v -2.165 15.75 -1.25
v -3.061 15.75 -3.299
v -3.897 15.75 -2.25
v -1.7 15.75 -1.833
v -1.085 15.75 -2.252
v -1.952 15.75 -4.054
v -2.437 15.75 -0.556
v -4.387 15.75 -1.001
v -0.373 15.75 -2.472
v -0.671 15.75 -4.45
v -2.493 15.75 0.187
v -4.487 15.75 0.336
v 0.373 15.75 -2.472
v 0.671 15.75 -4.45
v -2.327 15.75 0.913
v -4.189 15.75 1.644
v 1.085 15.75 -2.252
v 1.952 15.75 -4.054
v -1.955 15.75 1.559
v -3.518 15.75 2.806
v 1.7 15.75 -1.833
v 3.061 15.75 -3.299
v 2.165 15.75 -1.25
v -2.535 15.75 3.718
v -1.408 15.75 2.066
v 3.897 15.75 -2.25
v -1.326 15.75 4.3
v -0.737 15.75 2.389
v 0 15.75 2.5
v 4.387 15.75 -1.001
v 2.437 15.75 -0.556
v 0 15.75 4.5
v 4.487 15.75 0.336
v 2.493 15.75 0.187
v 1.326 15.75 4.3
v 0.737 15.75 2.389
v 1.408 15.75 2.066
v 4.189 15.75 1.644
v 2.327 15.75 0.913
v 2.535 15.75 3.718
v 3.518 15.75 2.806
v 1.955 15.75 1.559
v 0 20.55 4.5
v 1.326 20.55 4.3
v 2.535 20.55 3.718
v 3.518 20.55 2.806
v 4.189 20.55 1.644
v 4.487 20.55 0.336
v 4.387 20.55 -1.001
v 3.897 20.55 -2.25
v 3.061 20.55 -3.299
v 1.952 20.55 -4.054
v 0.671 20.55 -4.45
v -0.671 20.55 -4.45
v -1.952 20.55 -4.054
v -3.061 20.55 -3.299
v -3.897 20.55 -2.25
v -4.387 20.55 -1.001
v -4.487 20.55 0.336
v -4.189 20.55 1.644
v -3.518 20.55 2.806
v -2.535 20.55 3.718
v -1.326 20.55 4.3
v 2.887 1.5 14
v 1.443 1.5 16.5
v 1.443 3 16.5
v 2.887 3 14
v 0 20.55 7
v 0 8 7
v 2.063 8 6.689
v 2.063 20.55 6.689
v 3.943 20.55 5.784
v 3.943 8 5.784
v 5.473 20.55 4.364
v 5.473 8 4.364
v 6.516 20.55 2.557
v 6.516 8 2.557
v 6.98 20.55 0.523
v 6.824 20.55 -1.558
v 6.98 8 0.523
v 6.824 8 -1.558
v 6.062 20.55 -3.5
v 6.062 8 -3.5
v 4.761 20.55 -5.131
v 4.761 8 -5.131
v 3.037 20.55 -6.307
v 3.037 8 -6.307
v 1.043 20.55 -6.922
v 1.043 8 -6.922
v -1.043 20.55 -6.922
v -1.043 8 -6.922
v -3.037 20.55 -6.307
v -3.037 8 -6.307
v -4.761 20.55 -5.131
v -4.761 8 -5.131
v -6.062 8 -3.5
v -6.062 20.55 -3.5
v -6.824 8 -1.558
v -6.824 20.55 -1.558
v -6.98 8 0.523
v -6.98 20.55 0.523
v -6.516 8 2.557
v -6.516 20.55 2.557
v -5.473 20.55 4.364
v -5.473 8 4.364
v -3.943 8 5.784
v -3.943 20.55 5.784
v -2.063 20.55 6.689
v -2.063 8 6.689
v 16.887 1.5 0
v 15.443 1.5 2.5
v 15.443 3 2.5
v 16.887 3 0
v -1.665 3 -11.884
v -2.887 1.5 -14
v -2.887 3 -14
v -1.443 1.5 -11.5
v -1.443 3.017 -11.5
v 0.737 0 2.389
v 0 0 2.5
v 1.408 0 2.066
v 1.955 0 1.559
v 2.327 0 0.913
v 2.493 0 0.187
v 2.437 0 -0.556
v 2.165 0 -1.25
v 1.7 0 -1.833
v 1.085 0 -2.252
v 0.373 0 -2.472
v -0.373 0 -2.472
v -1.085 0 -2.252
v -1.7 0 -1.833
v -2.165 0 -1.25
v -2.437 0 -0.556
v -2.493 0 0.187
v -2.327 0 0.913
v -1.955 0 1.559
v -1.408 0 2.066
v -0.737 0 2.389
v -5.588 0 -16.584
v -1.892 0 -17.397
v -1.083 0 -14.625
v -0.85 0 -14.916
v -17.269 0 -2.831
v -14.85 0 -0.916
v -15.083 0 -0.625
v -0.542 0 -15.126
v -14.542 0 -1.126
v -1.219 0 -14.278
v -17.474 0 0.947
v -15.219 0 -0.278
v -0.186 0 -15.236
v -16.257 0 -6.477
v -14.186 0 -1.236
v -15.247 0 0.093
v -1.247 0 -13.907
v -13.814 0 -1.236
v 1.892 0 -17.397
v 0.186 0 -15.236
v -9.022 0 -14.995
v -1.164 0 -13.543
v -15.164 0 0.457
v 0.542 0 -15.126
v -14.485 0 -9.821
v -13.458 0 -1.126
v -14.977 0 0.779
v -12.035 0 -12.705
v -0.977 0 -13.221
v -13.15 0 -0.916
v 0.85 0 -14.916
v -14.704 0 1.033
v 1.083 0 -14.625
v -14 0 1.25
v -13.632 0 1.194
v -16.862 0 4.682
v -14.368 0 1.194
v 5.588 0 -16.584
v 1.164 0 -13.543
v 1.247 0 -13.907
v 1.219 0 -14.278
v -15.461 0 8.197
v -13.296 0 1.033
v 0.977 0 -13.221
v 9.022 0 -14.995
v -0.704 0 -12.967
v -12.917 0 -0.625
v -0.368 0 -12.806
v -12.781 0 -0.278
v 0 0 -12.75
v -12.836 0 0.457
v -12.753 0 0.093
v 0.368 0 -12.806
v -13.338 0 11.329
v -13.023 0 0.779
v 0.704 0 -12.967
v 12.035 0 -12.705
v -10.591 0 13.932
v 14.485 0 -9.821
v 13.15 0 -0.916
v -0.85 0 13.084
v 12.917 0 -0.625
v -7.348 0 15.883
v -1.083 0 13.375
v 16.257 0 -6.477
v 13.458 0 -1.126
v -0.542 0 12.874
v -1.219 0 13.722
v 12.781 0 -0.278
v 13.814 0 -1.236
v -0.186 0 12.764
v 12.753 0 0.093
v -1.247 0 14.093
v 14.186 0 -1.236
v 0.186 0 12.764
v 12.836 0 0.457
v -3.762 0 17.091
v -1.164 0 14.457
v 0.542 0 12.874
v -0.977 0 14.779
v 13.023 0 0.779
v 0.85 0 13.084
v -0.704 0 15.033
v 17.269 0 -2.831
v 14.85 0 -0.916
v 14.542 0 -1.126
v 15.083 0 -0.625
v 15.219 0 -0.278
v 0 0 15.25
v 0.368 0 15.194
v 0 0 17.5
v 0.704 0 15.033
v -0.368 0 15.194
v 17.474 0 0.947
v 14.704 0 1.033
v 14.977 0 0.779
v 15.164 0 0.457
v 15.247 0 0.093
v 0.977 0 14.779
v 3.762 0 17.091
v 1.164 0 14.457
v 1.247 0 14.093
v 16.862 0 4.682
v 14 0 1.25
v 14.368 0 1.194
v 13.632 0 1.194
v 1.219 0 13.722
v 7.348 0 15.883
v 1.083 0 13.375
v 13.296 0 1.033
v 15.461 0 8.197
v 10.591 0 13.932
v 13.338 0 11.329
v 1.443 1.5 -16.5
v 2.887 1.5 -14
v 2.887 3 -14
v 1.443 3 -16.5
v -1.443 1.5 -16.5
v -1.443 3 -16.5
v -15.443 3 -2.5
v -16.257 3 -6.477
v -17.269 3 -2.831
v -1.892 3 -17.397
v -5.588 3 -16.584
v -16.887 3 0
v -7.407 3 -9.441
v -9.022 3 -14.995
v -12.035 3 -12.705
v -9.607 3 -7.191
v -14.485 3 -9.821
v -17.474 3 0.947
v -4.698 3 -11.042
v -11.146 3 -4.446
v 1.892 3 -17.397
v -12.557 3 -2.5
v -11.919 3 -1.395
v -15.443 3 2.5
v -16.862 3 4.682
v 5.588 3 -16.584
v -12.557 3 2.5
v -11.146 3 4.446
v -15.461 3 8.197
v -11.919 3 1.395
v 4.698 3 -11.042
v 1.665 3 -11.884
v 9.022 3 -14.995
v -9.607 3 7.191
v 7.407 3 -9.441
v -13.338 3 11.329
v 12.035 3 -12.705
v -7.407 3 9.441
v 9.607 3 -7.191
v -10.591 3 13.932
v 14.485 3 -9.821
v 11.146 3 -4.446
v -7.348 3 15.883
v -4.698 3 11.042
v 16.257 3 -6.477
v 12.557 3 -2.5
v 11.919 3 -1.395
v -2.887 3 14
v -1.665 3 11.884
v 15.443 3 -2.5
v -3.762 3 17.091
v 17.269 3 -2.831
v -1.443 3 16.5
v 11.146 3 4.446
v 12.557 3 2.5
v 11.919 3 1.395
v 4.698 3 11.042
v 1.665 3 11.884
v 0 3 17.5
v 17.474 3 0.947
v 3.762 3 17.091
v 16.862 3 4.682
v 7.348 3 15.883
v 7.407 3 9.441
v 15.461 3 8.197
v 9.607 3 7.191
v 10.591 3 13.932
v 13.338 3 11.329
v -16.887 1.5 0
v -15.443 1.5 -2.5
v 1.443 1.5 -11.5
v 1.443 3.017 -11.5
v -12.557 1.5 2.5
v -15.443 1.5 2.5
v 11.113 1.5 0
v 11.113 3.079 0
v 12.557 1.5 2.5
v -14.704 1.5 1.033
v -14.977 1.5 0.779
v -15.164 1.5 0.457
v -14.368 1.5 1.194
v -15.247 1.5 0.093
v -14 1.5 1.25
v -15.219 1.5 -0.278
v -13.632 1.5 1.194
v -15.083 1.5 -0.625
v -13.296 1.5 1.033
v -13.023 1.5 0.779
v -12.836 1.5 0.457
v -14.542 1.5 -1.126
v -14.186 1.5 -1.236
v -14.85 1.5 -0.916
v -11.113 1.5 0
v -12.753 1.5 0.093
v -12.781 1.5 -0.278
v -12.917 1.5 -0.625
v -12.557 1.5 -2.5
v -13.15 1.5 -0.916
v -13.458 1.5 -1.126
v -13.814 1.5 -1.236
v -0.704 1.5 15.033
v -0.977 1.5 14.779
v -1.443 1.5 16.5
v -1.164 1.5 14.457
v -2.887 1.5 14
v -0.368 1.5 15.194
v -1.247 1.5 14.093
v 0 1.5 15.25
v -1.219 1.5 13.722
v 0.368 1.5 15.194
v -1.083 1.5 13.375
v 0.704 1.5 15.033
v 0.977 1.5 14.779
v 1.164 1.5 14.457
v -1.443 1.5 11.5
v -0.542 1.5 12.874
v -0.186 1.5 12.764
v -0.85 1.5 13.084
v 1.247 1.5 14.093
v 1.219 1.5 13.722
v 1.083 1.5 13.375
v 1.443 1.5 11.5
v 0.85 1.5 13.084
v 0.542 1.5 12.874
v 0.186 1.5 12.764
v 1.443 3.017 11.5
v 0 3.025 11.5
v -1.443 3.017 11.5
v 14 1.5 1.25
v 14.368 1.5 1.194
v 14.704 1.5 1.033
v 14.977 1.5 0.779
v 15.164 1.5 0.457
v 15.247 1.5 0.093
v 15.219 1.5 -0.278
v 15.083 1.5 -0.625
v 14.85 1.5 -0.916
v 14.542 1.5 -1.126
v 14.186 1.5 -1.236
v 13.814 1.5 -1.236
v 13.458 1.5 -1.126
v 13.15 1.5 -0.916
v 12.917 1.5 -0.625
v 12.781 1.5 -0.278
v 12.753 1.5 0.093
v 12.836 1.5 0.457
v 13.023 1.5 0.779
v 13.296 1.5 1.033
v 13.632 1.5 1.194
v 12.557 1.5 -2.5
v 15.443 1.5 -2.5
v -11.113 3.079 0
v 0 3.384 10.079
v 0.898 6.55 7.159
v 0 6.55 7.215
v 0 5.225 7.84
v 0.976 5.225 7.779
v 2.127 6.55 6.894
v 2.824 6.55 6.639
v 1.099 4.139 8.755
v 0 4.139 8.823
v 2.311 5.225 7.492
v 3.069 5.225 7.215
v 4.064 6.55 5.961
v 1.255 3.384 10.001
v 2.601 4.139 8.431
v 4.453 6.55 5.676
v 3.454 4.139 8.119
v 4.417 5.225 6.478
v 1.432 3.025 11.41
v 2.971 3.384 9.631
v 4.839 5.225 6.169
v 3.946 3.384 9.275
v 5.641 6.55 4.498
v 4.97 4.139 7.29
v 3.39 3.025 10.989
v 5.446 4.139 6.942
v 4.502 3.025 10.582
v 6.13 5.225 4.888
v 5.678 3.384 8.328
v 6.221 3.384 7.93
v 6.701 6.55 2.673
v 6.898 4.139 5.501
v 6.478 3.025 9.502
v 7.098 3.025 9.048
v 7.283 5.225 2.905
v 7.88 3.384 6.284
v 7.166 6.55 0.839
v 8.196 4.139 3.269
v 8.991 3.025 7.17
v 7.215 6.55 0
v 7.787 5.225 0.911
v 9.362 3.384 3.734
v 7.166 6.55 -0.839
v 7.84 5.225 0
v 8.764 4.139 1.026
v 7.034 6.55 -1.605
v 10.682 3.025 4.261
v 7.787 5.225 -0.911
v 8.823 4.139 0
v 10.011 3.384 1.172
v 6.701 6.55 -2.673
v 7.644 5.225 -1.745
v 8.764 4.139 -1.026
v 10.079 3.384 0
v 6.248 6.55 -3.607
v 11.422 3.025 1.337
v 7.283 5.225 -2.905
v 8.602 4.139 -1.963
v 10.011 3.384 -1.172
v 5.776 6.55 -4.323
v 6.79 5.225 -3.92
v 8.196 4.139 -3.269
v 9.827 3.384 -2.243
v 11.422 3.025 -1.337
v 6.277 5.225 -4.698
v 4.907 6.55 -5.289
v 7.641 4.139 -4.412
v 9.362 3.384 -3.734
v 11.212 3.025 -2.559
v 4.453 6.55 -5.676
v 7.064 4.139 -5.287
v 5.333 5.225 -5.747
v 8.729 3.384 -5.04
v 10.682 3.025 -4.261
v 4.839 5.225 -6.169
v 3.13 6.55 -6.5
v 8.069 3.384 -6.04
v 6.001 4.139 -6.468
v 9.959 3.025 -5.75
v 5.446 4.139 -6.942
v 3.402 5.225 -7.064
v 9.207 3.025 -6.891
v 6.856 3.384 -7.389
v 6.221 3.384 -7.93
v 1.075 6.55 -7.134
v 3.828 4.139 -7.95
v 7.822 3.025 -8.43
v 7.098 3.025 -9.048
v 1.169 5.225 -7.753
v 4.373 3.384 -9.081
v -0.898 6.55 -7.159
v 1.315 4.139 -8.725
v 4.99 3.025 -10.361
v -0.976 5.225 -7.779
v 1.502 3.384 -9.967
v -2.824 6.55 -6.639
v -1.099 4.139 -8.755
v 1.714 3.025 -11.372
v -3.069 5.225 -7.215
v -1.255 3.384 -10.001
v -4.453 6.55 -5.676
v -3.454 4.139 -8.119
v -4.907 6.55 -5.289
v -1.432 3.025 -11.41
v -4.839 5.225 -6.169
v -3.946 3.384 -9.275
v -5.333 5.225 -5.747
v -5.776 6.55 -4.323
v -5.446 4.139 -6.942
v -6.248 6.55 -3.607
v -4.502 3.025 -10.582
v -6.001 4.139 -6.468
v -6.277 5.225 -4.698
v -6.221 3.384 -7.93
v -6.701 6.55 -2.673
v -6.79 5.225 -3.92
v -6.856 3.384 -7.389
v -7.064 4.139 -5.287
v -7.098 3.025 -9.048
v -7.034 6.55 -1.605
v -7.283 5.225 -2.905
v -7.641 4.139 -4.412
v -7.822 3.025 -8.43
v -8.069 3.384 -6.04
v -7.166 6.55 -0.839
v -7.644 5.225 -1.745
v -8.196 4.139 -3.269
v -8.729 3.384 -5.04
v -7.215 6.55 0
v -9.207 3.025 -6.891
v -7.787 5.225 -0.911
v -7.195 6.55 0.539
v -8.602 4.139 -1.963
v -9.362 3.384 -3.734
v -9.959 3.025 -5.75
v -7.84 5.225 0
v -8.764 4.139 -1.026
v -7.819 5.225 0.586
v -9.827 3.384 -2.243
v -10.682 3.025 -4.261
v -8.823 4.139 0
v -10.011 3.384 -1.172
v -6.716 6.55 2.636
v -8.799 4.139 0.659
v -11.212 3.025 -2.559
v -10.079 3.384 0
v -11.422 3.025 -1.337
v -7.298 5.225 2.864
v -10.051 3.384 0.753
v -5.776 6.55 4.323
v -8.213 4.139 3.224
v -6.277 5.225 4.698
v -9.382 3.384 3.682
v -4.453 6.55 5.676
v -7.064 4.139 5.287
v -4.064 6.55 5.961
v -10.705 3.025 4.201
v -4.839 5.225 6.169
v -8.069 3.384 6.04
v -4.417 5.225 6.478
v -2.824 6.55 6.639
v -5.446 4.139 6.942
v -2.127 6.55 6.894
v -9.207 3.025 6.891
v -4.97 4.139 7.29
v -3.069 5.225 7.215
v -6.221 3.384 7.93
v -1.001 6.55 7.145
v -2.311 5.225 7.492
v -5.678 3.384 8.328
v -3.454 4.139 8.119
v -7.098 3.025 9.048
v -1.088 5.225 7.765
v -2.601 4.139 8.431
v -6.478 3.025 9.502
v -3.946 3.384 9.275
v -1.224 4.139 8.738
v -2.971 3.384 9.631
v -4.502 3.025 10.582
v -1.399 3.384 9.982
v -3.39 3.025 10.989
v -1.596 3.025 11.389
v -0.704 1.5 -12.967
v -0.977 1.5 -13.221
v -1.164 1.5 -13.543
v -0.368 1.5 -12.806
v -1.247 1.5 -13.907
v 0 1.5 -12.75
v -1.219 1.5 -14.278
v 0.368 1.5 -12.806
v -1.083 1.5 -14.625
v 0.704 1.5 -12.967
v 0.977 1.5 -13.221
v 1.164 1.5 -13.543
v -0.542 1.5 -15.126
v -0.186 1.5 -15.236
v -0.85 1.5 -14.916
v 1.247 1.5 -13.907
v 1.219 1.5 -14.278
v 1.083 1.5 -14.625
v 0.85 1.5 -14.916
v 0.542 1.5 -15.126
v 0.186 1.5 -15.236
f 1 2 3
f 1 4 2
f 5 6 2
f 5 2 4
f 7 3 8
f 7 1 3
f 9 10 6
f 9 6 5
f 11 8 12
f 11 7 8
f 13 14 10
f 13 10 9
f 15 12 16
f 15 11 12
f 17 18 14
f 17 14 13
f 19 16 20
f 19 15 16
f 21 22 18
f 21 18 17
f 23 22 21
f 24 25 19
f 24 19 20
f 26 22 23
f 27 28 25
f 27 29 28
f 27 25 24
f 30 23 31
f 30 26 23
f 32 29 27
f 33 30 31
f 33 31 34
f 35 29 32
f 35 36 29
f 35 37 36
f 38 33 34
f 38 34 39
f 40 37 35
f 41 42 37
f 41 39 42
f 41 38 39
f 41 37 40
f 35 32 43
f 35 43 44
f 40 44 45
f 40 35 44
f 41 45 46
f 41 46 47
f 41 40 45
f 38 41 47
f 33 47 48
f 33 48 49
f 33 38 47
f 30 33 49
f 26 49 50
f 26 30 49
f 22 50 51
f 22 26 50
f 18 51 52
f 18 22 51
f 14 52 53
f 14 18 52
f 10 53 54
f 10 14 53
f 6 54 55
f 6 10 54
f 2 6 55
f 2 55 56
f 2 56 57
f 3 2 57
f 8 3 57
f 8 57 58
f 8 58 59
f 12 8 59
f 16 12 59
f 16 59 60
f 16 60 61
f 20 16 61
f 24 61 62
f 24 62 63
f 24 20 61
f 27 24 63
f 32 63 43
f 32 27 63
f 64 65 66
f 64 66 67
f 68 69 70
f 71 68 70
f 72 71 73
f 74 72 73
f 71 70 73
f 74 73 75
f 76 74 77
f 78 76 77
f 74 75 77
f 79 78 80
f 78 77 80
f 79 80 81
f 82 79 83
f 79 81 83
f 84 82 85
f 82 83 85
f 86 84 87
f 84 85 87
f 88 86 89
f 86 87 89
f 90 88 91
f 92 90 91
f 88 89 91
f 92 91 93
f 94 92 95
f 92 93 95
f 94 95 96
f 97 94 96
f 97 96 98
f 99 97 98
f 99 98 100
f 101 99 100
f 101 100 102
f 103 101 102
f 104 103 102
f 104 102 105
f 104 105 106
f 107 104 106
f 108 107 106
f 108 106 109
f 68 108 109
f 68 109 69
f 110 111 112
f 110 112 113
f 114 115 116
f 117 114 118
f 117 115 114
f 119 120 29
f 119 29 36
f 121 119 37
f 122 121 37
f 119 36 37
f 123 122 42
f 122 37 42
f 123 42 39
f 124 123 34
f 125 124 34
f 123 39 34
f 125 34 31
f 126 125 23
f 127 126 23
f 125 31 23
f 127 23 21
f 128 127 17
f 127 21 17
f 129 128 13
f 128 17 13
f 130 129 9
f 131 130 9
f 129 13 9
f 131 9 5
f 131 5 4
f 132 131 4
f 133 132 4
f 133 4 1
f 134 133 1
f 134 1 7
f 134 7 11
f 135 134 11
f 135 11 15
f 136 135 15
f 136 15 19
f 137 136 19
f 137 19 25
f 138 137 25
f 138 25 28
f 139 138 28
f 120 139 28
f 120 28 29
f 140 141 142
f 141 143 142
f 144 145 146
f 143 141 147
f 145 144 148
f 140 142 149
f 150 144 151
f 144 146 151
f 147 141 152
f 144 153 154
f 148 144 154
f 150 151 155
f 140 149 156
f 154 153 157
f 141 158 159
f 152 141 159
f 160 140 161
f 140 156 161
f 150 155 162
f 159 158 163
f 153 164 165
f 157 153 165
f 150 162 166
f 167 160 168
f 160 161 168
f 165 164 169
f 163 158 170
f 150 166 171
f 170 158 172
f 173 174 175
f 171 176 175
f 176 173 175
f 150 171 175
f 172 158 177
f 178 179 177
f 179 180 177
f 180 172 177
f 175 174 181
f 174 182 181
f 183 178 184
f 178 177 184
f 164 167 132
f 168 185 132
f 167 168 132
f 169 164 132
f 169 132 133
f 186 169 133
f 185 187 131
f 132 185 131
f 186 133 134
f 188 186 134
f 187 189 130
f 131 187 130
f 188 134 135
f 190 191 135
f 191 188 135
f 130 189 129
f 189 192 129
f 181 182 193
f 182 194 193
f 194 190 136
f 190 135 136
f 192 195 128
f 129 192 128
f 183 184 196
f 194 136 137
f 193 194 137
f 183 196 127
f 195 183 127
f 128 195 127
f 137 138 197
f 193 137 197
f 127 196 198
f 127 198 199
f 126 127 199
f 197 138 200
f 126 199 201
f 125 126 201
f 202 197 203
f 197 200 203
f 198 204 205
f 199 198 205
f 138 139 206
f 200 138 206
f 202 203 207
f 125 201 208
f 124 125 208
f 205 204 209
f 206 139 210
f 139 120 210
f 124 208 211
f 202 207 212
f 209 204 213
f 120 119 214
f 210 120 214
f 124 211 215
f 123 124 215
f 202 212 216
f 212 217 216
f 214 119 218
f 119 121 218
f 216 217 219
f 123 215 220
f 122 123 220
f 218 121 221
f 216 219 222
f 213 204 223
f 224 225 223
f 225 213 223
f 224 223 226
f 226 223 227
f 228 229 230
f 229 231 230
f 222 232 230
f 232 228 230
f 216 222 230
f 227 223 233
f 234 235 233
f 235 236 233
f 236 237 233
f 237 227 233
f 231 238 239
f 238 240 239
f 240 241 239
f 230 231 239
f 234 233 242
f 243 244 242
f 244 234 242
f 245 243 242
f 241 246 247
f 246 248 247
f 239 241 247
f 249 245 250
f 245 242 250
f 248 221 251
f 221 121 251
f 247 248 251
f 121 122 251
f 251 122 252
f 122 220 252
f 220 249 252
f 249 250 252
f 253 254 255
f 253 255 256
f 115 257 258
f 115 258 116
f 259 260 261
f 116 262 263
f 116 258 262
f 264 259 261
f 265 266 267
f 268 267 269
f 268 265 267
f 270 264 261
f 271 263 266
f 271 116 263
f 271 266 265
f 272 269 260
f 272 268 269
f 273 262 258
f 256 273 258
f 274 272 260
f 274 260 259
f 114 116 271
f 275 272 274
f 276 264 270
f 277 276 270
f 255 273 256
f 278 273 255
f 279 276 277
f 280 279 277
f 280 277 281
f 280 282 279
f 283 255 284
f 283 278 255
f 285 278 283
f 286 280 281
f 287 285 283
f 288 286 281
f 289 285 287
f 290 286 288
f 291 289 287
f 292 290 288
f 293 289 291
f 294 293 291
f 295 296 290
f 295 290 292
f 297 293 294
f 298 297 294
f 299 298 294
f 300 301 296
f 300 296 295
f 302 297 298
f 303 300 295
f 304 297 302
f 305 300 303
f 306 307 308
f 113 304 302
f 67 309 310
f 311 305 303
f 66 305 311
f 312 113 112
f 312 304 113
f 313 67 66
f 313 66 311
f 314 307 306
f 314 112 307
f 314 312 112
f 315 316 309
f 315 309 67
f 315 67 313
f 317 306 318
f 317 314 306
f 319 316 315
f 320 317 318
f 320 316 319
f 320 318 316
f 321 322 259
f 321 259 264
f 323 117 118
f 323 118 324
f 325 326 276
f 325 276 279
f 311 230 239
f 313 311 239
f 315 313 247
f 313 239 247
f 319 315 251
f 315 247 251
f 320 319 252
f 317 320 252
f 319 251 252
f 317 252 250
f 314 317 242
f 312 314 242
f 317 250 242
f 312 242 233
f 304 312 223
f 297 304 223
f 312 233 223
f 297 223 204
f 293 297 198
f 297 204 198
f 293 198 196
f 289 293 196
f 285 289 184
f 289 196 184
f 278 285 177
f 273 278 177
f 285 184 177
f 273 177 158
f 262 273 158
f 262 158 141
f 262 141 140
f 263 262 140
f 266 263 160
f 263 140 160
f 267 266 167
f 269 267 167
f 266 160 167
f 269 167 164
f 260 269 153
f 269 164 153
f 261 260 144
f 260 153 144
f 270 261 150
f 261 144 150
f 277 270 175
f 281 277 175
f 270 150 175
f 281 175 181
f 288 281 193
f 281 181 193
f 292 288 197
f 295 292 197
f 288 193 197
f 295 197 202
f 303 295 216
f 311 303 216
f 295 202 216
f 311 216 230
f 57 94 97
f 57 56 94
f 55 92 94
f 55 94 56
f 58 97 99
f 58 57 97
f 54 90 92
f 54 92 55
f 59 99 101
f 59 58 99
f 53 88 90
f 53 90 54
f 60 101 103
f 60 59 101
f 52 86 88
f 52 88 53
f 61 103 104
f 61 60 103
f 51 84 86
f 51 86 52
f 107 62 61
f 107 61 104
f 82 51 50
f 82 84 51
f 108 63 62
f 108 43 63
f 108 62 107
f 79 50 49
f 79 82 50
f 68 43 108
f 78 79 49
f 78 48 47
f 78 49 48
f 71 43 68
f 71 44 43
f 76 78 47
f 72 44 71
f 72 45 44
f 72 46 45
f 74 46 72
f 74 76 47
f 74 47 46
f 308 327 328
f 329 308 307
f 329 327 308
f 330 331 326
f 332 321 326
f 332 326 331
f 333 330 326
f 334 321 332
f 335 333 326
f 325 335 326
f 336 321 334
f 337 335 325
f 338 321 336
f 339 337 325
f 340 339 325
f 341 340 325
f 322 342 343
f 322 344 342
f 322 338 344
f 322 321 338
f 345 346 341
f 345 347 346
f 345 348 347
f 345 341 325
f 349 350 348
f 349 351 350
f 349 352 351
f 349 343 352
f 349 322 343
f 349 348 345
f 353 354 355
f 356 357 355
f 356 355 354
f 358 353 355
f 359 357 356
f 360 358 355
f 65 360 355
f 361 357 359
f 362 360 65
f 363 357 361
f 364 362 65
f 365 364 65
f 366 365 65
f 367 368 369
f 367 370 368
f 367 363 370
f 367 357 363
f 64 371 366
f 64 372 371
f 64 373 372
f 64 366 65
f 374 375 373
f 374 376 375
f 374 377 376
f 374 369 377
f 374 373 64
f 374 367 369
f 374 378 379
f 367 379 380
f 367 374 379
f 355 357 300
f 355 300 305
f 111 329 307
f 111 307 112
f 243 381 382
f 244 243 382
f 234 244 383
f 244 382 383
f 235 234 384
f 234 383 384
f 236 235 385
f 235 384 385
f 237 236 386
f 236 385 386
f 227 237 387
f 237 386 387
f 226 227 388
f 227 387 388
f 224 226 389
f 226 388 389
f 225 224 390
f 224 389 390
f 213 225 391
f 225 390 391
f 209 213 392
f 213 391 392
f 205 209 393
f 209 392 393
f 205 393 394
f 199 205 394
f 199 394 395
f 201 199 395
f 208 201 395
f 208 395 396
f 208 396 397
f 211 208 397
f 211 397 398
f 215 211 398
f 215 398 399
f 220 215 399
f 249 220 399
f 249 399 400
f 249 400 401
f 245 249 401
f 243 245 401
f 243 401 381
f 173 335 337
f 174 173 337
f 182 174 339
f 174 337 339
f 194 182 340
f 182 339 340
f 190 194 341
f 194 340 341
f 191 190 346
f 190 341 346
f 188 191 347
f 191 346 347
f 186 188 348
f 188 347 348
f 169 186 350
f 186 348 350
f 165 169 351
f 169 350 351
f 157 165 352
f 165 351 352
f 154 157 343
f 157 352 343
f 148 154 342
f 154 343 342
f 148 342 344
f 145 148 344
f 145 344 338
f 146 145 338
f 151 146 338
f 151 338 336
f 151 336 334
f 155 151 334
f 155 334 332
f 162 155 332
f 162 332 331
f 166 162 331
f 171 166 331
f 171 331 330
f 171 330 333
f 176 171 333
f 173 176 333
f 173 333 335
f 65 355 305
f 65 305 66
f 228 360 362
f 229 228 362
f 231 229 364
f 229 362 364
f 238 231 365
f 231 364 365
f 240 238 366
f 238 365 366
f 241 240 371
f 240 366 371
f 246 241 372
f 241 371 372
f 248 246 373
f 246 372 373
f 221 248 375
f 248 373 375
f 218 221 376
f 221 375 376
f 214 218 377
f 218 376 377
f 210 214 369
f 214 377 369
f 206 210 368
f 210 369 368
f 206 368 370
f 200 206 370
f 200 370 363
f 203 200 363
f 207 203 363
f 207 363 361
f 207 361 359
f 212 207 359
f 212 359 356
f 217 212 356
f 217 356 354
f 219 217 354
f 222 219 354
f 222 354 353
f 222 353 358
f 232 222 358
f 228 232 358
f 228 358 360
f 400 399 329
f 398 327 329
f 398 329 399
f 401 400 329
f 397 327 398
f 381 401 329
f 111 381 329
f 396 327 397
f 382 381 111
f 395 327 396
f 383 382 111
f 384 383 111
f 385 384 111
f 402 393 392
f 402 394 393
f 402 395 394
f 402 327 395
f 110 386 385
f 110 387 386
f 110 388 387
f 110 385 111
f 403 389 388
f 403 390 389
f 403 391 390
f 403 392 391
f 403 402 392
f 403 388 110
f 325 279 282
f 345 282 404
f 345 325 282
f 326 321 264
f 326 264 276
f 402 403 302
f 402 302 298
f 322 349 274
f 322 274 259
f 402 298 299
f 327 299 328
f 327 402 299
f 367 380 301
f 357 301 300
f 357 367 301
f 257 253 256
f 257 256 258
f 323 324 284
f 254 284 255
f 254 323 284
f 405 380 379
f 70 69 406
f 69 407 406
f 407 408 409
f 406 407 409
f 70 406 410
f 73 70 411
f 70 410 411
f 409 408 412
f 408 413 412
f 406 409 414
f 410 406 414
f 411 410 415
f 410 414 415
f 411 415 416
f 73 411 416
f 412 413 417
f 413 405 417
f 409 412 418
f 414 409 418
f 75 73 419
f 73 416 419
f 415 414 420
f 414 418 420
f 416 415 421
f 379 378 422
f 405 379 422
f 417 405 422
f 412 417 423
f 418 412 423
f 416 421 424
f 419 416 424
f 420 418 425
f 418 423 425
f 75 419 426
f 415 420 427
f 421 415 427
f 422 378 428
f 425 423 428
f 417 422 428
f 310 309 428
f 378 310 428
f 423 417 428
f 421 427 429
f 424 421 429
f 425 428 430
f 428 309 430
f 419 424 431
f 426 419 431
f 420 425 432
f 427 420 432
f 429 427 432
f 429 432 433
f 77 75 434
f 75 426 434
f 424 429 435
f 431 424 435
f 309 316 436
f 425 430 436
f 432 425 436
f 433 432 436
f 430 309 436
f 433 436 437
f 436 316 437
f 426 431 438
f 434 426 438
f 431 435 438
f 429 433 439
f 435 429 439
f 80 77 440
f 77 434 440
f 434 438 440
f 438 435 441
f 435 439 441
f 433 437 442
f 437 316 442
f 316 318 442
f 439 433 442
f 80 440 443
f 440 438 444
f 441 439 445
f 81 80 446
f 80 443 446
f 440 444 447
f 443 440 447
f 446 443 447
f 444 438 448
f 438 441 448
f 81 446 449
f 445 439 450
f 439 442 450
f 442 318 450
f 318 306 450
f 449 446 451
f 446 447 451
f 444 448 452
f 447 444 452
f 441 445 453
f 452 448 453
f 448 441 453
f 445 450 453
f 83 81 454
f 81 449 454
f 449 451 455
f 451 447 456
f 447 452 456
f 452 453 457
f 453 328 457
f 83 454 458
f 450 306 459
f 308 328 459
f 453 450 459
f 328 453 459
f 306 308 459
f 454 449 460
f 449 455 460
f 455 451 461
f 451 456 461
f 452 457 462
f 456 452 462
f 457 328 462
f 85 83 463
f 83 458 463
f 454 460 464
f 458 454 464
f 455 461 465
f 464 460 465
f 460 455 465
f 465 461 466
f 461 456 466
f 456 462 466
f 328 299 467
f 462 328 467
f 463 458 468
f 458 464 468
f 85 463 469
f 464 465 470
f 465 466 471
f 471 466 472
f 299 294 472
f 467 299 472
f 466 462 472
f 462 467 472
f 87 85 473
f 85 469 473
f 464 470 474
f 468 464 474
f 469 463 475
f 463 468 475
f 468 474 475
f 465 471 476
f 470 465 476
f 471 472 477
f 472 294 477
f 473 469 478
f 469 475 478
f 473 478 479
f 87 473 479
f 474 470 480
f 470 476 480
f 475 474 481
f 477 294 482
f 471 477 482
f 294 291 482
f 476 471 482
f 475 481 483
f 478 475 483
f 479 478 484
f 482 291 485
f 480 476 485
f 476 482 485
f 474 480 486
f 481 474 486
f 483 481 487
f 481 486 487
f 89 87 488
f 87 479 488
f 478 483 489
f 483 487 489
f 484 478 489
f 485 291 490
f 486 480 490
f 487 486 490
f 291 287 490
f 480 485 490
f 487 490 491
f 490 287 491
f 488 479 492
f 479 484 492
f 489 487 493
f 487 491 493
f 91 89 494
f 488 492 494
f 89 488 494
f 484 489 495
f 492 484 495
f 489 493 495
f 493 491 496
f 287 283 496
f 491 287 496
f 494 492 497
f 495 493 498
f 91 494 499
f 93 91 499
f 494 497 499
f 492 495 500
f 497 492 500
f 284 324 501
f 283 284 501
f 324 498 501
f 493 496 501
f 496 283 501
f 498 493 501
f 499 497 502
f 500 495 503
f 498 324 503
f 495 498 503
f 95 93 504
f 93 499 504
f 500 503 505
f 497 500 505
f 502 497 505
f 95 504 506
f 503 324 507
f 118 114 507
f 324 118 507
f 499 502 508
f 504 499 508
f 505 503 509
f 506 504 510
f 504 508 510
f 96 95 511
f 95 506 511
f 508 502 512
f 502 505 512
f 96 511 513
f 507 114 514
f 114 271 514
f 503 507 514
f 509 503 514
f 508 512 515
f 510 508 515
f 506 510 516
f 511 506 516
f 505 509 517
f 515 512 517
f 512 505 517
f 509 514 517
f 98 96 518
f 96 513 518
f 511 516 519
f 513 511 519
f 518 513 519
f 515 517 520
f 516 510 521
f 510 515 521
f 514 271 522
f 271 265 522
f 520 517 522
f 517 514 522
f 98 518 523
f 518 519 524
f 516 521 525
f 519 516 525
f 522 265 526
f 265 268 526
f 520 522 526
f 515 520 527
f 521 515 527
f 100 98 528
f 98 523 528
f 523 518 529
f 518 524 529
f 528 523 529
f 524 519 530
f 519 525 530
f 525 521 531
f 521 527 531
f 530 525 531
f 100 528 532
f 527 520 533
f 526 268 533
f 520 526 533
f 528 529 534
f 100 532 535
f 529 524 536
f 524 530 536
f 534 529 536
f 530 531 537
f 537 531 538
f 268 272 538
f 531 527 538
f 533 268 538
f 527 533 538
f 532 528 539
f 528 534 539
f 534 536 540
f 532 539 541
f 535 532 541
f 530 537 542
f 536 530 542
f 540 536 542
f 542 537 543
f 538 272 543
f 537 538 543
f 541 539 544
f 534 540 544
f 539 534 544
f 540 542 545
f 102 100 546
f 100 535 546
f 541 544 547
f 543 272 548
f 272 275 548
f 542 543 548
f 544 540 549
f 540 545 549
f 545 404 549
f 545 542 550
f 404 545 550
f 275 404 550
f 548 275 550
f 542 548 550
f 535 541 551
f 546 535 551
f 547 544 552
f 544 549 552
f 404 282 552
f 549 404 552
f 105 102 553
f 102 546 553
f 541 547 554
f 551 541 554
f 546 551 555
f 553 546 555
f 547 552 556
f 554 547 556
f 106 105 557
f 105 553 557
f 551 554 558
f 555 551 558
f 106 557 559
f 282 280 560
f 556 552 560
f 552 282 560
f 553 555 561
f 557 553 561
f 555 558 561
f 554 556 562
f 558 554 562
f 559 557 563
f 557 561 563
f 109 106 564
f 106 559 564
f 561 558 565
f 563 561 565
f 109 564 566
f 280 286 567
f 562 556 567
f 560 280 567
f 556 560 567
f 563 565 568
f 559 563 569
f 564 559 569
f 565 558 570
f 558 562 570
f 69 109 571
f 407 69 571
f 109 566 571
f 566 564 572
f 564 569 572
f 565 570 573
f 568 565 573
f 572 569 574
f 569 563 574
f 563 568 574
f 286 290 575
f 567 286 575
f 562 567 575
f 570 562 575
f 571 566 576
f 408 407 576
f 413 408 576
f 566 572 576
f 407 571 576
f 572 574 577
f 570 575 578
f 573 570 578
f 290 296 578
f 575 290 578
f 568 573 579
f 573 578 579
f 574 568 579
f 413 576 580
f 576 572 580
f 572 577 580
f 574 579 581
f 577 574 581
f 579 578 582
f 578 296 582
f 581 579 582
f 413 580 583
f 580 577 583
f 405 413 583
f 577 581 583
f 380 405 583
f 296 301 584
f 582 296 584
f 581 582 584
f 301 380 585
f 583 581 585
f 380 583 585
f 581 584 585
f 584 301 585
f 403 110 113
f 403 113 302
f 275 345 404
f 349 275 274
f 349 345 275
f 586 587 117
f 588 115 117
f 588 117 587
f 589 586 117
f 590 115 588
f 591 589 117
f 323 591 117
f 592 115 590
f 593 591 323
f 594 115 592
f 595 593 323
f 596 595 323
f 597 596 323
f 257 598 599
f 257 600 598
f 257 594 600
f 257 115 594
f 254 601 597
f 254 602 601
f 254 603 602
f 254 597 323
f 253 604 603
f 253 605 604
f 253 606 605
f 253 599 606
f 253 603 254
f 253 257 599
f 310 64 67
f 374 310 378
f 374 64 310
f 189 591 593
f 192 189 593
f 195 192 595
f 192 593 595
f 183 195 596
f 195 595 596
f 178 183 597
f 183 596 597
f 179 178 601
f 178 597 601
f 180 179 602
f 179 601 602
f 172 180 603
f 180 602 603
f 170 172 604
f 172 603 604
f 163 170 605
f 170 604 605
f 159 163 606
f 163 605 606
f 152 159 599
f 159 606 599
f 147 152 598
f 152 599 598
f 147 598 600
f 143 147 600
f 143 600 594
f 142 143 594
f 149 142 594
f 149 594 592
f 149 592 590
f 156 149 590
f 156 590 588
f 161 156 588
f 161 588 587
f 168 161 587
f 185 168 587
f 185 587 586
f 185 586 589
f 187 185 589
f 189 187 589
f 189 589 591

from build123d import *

# Parameters (mm, degrees)
SKETCH1_R               = 17.5
BOSS_EXTRUDE1_DEPTH     = 3
SKETCH2_R               = 7
BOSS_EXTRUDE2_DEPTH     = 12.75
SKETCH3_R               = 7
SKETCH3_R_2             = 4.5
BOSS_EXTRUDE3_DEPTH     = 4.8
SKETCH4_R               = 2.5
CUT_EXTRUDE1_DEPTH      = 19.8
FILLET1_R               = 5
SKETCH5_R               = 1.25
CUT_EXTRUDE2_DEPTH      = 3
CUT_EXTRUDE3_DEPTH      = 1.5
CUT_EXTRUDE3_DEPTH_BACK = 1.5


with BuildPart() as part:
    # Sketch1 → Boss-Extrude1 (new body)
    with BuildSketch(Plane(origin=(0, 0, 0), x_dir=(1, 0, 0), z_dir=(0, 1, 0))):
        with Locations(Location((0, 0, 0), (0, 0, 270))):
            Circle(SKETCH1_R)
    extrude(amount=BOSS_EXTRUDE1_DEPTH)

    # Sketch2 → Boss-Extrude2 (add)
    with BuildSketch(Plane(origin=(0, 3, 0), x_dir=(1, 0, 0), z_dir=(0, 1, 0))):
        with Locations(Location((0, 0, 0), (0, 0, 270))):
            Circle(SKETCH2_R)
    extrude(amount=BOSS_EXTRUDE2_DEPTH)

    # Sketch3 → Boss-Extrude3 (add)
    with BuildSketch(Plane(origin=(0, 15.75, 0), x_dir=(1, 0, 0), z_dir=(0, 1, 0))):
        with Locations(Location((0, 0, 0), (0, 0, 270))):
            Circle(SKETCH3_R)
        with Locations(Location((0, 0, 0), (0, 0, 270))):
            Circle(SKETCH3_R_2, mode=Mode.SUBTRACT)
    extrude(amount=BOSS_EXTRUDE3_DEPTH)

    # Sketch4 → Cut-Extrude1 (cut)
    with BuildSketch(Plane(origin=(0, 15.75, 0), x_dir=(1, 0, 0), z_dir=(0, 1, 0))):
        with Locations(Location((0, 0, 0), (0, 0, 270))):
            Circle(SKETCH4_R)
    extrude(amount=-CUT_EXTRUDE1_DEPTH, mode=Mode.SUBTRACT)

    # Fillet1
    fillet1_edges = [part.edges().sort_by_distance(p)[0] for p in [
        (0, 3, -7),
    ]]
    fillet(fillet1_edges, radius=FILLET1_R)

    # Sketch5 → Cut-Extrude2 (cut)
    with BuildSketch(Plane(origin=(0, 3, 0), x_dir=(1, 0, 0), z_dir=(0, 1, 0))):
        with Locations(Location((0, 14, 0), (0, 0, 270))):
            Circle(SKETCH5_R)
        with Locations(Location((14, 0, 0), (0, 0, 270))):
            Circle(SKETCH5_R)
        with Locations(Location((0, -14, 0), (0, 0, 270))):
            Circle(SKETCH5_R)
        with Locations(Location((-14, 0, 0), (0, 0, 270))):
            Circle(SKETCH5_R)
    extrude(amount=-CUT_EXTRUDE2_DEPTH, mode=Mode.SUBTRACT)

    # Sketch6 → Cut-Extrude3 (cut, two sides: drawn at the far end of the back side and taken through both)
    with BuildSketch(Plane(origin=(0, 3, 0), x_dir=(1, 0, 0), z_dir=(0, 1, 0)).offset(-CUT_EXTRUDE3_DEPTH_BACK)):
        Polygon((2.886751346, 14), (1.443375673, 16.5), (-1.443375673, 16.5), (-2.886751346, 14), (-1.443375673, 11.5), (1.443375673, 11.5), align=None)
        Polygon((16.886751346, 0), (15.443375673, 2.5), (12.556624327, 2.5), (11.113248654, 0), (12.556624327, -2.5), (15.443375673, -2.5), align=None)
        Polygon((2.886751346, -14), (1.443375673, -11.5), (-1.443375673, -11.5), (-2.886751346, -14), (-1.443375673, -16.5), (1.443375673, -16.5), align=None)
        Polygon((-11.113248654, 0), (-12.556624327, 2.5), (-15.443375673, 2.5), (-16.886751346, 0), (-15.443375673, -2.5), (-12.556624327, -2.5), align=None)
    extrude(amount=CUT_EXTRUDE3_DEPTH + CUT_EXTRUDE3_DEPTH_BACK, mode=Mode.SUBTRACT)


solid = part.part
